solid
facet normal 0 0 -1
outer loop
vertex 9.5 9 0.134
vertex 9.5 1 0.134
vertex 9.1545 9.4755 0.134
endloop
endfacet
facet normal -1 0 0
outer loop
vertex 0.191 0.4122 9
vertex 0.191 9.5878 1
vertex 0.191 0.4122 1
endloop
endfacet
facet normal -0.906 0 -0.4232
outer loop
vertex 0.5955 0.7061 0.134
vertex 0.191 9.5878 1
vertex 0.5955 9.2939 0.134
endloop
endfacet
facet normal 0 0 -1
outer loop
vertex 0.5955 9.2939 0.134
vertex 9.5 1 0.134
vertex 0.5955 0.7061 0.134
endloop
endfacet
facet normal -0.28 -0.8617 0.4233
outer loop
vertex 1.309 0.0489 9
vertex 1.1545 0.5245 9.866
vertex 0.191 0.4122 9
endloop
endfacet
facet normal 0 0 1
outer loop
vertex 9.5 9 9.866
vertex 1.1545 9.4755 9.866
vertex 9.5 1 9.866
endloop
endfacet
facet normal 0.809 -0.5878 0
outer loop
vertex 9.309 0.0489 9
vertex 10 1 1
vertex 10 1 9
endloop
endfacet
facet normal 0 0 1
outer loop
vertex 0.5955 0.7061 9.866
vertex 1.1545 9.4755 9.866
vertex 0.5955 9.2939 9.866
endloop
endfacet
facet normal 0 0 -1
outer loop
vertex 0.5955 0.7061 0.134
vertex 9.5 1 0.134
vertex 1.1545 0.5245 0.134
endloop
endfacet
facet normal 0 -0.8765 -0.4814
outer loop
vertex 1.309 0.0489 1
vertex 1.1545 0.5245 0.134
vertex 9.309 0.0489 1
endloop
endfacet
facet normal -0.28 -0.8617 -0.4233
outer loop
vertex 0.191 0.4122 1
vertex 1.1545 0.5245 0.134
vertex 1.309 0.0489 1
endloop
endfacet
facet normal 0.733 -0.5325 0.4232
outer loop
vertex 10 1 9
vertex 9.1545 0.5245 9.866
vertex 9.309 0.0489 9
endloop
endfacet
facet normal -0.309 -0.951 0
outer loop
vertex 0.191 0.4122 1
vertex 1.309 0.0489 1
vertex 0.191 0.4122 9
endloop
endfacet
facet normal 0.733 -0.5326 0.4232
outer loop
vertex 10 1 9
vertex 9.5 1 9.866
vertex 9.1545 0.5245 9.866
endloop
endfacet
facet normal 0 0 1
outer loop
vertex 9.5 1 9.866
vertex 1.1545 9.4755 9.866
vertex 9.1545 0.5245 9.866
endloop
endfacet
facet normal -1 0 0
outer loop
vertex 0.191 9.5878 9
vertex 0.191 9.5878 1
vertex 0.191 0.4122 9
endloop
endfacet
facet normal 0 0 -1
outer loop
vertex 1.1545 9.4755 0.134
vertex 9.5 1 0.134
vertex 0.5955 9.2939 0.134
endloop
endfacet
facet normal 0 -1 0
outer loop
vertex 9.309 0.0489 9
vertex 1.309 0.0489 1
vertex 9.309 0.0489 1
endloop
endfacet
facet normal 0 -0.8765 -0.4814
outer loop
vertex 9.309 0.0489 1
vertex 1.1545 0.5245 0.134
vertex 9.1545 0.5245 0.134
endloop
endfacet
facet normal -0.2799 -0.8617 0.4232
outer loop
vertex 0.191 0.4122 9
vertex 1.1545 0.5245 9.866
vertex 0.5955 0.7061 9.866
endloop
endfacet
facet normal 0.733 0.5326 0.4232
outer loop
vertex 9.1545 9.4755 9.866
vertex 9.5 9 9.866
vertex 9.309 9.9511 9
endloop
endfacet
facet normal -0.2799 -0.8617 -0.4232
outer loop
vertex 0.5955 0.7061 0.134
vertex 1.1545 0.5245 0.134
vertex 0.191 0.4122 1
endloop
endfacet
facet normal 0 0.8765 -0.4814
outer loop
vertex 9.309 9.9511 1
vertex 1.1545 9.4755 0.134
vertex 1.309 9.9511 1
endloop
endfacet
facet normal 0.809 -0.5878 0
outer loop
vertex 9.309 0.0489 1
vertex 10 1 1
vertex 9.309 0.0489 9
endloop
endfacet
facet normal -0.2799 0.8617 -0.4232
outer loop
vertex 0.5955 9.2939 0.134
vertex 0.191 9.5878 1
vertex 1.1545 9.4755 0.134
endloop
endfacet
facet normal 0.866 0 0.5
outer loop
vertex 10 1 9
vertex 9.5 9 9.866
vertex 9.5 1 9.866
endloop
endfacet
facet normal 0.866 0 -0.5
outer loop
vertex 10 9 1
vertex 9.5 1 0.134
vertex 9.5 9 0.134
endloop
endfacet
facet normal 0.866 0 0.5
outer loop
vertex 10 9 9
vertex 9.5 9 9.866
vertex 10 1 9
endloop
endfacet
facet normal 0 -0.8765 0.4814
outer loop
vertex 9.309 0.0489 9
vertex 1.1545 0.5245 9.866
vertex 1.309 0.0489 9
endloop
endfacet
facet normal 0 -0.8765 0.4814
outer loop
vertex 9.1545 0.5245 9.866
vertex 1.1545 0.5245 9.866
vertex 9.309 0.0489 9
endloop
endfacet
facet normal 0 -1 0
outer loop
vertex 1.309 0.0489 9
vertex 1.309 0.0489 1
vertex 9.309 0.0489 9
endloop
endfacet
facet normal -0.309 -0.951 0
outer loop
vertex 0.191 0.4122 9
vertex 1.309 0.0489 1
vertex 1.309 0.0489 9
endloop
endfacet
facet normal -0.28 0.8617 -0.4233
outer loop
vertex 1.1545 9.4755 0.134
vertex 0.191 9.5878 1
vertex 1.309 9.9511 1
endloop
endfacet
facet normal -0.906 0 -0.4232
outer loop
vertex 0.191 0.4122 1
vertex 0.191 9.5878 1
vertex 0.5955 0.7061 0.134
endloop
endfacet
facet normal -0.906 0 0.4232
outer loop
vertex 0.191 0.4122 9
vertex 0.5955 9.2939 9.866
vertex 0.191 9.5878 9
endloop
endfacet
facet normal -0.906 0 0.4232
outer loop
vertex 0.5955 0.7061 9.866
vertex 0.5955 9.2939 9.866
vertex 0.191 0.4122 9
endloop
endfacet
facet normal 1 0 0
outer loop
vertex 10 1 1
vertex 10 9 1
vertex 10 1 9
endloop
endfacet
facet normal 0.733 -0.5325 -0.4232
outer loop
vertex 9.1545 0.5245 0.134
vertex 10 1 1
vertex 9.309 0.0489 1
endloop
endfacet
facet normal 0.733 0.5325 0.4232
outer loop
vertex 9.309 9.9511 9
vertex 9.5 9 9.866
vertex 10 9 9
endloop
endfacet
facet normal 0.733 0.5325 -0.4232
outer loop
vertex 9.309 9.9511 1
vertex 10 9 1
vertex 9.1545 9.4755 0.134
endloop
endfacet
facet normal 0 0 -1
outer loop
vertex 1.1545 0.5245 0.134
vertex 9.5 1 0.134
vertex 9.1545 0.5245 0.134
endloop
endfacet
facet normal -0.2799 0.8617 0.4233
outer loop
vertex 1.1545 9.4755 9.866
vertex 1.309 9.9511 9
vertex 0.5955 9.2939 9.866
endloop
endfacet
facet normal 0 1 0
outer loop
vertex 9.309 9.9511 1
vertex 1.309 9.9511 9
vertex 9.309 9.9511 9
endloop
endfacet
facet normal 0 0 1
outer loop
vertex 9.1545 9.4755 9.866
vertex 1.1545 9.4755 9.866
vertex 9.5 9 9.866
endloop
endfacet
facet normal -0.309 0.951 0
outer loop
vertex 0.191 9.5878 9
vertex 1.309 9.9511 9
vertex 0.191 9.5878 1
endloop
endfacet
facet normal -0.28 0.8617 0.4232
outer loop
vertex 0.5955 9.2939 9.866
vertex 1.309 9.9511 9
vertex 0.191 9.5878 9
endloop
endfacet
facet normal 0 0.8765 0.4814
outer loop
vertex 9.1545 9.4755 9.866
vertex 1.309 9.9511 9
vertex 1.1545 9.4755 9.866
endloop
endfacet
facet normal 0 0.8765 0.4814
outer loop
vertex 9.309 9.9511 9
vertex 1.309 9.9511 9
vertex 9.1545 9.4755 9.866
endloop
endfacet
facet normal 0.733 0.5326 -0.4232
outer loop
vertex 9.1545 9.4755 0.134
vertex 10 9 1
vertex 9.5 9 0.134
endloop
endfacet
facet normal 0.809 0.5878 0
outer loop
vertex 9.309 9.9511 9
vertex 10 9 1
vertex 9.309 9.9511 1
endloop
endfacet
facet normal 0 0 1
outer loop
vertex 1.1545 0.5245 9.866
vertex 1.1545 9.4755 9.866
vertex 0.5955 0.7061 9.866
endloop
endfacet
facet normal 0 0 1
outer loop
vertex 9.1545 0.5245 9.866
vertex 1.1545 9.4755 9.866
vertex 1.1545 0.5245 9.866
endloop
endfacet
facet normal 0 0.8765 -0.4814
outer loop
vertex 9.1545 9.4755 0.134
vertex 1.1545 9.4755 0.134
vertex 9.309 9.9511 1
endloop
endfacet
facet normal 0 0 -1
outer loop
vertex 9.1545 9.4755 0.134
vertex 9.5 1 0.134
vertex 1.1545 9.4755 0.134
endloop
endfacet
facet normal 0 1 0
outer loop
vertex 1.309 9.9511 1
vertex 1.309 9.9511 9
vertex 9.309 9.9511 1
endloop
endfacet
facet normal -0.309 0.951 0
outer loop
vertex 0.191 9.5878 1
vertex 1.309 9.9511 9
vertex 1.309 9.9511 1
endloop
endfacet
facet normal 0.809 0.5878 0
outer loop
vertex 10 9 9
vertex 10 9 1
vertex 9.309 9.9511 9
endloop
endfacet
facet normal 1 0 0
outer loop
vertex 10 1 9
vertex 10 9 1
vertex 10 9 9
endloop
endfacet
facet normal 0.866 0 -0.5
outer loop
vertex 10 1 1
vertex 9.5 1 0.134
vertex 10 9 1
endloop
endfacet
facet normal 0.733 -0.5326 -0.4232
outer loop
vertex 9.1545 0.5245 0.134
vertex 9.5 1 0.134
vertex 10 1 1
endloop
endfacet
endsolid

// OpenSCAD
rounded_cube([10, 10, 10]);

module rounded_cube(size, radius = 1)
{
    hull()
    {
        x = size[0];
        y = size[1];
        z = size[2];

        translate([radius, radius, radius])
        sphere(r = radius);

        translate([x - radius, radius, radius])
        sphere(r = radius);

        translate([x - radius, y - radius, radius])
        sphere(r = radius);

        translate([radius, y - radius, radius])
        sphere(r = radius);

        translate([radius, radius, z - radius])
        sphere(r = radius);

        translate([x - radius, radius, z - radius])
        sphere(r = radius);

        translate([x - radius, y - radius, z - radius])
        sphere(r = radius);

        translate([radius, y - radius, z - radius])
        sphere(r = radius);
    }
}
